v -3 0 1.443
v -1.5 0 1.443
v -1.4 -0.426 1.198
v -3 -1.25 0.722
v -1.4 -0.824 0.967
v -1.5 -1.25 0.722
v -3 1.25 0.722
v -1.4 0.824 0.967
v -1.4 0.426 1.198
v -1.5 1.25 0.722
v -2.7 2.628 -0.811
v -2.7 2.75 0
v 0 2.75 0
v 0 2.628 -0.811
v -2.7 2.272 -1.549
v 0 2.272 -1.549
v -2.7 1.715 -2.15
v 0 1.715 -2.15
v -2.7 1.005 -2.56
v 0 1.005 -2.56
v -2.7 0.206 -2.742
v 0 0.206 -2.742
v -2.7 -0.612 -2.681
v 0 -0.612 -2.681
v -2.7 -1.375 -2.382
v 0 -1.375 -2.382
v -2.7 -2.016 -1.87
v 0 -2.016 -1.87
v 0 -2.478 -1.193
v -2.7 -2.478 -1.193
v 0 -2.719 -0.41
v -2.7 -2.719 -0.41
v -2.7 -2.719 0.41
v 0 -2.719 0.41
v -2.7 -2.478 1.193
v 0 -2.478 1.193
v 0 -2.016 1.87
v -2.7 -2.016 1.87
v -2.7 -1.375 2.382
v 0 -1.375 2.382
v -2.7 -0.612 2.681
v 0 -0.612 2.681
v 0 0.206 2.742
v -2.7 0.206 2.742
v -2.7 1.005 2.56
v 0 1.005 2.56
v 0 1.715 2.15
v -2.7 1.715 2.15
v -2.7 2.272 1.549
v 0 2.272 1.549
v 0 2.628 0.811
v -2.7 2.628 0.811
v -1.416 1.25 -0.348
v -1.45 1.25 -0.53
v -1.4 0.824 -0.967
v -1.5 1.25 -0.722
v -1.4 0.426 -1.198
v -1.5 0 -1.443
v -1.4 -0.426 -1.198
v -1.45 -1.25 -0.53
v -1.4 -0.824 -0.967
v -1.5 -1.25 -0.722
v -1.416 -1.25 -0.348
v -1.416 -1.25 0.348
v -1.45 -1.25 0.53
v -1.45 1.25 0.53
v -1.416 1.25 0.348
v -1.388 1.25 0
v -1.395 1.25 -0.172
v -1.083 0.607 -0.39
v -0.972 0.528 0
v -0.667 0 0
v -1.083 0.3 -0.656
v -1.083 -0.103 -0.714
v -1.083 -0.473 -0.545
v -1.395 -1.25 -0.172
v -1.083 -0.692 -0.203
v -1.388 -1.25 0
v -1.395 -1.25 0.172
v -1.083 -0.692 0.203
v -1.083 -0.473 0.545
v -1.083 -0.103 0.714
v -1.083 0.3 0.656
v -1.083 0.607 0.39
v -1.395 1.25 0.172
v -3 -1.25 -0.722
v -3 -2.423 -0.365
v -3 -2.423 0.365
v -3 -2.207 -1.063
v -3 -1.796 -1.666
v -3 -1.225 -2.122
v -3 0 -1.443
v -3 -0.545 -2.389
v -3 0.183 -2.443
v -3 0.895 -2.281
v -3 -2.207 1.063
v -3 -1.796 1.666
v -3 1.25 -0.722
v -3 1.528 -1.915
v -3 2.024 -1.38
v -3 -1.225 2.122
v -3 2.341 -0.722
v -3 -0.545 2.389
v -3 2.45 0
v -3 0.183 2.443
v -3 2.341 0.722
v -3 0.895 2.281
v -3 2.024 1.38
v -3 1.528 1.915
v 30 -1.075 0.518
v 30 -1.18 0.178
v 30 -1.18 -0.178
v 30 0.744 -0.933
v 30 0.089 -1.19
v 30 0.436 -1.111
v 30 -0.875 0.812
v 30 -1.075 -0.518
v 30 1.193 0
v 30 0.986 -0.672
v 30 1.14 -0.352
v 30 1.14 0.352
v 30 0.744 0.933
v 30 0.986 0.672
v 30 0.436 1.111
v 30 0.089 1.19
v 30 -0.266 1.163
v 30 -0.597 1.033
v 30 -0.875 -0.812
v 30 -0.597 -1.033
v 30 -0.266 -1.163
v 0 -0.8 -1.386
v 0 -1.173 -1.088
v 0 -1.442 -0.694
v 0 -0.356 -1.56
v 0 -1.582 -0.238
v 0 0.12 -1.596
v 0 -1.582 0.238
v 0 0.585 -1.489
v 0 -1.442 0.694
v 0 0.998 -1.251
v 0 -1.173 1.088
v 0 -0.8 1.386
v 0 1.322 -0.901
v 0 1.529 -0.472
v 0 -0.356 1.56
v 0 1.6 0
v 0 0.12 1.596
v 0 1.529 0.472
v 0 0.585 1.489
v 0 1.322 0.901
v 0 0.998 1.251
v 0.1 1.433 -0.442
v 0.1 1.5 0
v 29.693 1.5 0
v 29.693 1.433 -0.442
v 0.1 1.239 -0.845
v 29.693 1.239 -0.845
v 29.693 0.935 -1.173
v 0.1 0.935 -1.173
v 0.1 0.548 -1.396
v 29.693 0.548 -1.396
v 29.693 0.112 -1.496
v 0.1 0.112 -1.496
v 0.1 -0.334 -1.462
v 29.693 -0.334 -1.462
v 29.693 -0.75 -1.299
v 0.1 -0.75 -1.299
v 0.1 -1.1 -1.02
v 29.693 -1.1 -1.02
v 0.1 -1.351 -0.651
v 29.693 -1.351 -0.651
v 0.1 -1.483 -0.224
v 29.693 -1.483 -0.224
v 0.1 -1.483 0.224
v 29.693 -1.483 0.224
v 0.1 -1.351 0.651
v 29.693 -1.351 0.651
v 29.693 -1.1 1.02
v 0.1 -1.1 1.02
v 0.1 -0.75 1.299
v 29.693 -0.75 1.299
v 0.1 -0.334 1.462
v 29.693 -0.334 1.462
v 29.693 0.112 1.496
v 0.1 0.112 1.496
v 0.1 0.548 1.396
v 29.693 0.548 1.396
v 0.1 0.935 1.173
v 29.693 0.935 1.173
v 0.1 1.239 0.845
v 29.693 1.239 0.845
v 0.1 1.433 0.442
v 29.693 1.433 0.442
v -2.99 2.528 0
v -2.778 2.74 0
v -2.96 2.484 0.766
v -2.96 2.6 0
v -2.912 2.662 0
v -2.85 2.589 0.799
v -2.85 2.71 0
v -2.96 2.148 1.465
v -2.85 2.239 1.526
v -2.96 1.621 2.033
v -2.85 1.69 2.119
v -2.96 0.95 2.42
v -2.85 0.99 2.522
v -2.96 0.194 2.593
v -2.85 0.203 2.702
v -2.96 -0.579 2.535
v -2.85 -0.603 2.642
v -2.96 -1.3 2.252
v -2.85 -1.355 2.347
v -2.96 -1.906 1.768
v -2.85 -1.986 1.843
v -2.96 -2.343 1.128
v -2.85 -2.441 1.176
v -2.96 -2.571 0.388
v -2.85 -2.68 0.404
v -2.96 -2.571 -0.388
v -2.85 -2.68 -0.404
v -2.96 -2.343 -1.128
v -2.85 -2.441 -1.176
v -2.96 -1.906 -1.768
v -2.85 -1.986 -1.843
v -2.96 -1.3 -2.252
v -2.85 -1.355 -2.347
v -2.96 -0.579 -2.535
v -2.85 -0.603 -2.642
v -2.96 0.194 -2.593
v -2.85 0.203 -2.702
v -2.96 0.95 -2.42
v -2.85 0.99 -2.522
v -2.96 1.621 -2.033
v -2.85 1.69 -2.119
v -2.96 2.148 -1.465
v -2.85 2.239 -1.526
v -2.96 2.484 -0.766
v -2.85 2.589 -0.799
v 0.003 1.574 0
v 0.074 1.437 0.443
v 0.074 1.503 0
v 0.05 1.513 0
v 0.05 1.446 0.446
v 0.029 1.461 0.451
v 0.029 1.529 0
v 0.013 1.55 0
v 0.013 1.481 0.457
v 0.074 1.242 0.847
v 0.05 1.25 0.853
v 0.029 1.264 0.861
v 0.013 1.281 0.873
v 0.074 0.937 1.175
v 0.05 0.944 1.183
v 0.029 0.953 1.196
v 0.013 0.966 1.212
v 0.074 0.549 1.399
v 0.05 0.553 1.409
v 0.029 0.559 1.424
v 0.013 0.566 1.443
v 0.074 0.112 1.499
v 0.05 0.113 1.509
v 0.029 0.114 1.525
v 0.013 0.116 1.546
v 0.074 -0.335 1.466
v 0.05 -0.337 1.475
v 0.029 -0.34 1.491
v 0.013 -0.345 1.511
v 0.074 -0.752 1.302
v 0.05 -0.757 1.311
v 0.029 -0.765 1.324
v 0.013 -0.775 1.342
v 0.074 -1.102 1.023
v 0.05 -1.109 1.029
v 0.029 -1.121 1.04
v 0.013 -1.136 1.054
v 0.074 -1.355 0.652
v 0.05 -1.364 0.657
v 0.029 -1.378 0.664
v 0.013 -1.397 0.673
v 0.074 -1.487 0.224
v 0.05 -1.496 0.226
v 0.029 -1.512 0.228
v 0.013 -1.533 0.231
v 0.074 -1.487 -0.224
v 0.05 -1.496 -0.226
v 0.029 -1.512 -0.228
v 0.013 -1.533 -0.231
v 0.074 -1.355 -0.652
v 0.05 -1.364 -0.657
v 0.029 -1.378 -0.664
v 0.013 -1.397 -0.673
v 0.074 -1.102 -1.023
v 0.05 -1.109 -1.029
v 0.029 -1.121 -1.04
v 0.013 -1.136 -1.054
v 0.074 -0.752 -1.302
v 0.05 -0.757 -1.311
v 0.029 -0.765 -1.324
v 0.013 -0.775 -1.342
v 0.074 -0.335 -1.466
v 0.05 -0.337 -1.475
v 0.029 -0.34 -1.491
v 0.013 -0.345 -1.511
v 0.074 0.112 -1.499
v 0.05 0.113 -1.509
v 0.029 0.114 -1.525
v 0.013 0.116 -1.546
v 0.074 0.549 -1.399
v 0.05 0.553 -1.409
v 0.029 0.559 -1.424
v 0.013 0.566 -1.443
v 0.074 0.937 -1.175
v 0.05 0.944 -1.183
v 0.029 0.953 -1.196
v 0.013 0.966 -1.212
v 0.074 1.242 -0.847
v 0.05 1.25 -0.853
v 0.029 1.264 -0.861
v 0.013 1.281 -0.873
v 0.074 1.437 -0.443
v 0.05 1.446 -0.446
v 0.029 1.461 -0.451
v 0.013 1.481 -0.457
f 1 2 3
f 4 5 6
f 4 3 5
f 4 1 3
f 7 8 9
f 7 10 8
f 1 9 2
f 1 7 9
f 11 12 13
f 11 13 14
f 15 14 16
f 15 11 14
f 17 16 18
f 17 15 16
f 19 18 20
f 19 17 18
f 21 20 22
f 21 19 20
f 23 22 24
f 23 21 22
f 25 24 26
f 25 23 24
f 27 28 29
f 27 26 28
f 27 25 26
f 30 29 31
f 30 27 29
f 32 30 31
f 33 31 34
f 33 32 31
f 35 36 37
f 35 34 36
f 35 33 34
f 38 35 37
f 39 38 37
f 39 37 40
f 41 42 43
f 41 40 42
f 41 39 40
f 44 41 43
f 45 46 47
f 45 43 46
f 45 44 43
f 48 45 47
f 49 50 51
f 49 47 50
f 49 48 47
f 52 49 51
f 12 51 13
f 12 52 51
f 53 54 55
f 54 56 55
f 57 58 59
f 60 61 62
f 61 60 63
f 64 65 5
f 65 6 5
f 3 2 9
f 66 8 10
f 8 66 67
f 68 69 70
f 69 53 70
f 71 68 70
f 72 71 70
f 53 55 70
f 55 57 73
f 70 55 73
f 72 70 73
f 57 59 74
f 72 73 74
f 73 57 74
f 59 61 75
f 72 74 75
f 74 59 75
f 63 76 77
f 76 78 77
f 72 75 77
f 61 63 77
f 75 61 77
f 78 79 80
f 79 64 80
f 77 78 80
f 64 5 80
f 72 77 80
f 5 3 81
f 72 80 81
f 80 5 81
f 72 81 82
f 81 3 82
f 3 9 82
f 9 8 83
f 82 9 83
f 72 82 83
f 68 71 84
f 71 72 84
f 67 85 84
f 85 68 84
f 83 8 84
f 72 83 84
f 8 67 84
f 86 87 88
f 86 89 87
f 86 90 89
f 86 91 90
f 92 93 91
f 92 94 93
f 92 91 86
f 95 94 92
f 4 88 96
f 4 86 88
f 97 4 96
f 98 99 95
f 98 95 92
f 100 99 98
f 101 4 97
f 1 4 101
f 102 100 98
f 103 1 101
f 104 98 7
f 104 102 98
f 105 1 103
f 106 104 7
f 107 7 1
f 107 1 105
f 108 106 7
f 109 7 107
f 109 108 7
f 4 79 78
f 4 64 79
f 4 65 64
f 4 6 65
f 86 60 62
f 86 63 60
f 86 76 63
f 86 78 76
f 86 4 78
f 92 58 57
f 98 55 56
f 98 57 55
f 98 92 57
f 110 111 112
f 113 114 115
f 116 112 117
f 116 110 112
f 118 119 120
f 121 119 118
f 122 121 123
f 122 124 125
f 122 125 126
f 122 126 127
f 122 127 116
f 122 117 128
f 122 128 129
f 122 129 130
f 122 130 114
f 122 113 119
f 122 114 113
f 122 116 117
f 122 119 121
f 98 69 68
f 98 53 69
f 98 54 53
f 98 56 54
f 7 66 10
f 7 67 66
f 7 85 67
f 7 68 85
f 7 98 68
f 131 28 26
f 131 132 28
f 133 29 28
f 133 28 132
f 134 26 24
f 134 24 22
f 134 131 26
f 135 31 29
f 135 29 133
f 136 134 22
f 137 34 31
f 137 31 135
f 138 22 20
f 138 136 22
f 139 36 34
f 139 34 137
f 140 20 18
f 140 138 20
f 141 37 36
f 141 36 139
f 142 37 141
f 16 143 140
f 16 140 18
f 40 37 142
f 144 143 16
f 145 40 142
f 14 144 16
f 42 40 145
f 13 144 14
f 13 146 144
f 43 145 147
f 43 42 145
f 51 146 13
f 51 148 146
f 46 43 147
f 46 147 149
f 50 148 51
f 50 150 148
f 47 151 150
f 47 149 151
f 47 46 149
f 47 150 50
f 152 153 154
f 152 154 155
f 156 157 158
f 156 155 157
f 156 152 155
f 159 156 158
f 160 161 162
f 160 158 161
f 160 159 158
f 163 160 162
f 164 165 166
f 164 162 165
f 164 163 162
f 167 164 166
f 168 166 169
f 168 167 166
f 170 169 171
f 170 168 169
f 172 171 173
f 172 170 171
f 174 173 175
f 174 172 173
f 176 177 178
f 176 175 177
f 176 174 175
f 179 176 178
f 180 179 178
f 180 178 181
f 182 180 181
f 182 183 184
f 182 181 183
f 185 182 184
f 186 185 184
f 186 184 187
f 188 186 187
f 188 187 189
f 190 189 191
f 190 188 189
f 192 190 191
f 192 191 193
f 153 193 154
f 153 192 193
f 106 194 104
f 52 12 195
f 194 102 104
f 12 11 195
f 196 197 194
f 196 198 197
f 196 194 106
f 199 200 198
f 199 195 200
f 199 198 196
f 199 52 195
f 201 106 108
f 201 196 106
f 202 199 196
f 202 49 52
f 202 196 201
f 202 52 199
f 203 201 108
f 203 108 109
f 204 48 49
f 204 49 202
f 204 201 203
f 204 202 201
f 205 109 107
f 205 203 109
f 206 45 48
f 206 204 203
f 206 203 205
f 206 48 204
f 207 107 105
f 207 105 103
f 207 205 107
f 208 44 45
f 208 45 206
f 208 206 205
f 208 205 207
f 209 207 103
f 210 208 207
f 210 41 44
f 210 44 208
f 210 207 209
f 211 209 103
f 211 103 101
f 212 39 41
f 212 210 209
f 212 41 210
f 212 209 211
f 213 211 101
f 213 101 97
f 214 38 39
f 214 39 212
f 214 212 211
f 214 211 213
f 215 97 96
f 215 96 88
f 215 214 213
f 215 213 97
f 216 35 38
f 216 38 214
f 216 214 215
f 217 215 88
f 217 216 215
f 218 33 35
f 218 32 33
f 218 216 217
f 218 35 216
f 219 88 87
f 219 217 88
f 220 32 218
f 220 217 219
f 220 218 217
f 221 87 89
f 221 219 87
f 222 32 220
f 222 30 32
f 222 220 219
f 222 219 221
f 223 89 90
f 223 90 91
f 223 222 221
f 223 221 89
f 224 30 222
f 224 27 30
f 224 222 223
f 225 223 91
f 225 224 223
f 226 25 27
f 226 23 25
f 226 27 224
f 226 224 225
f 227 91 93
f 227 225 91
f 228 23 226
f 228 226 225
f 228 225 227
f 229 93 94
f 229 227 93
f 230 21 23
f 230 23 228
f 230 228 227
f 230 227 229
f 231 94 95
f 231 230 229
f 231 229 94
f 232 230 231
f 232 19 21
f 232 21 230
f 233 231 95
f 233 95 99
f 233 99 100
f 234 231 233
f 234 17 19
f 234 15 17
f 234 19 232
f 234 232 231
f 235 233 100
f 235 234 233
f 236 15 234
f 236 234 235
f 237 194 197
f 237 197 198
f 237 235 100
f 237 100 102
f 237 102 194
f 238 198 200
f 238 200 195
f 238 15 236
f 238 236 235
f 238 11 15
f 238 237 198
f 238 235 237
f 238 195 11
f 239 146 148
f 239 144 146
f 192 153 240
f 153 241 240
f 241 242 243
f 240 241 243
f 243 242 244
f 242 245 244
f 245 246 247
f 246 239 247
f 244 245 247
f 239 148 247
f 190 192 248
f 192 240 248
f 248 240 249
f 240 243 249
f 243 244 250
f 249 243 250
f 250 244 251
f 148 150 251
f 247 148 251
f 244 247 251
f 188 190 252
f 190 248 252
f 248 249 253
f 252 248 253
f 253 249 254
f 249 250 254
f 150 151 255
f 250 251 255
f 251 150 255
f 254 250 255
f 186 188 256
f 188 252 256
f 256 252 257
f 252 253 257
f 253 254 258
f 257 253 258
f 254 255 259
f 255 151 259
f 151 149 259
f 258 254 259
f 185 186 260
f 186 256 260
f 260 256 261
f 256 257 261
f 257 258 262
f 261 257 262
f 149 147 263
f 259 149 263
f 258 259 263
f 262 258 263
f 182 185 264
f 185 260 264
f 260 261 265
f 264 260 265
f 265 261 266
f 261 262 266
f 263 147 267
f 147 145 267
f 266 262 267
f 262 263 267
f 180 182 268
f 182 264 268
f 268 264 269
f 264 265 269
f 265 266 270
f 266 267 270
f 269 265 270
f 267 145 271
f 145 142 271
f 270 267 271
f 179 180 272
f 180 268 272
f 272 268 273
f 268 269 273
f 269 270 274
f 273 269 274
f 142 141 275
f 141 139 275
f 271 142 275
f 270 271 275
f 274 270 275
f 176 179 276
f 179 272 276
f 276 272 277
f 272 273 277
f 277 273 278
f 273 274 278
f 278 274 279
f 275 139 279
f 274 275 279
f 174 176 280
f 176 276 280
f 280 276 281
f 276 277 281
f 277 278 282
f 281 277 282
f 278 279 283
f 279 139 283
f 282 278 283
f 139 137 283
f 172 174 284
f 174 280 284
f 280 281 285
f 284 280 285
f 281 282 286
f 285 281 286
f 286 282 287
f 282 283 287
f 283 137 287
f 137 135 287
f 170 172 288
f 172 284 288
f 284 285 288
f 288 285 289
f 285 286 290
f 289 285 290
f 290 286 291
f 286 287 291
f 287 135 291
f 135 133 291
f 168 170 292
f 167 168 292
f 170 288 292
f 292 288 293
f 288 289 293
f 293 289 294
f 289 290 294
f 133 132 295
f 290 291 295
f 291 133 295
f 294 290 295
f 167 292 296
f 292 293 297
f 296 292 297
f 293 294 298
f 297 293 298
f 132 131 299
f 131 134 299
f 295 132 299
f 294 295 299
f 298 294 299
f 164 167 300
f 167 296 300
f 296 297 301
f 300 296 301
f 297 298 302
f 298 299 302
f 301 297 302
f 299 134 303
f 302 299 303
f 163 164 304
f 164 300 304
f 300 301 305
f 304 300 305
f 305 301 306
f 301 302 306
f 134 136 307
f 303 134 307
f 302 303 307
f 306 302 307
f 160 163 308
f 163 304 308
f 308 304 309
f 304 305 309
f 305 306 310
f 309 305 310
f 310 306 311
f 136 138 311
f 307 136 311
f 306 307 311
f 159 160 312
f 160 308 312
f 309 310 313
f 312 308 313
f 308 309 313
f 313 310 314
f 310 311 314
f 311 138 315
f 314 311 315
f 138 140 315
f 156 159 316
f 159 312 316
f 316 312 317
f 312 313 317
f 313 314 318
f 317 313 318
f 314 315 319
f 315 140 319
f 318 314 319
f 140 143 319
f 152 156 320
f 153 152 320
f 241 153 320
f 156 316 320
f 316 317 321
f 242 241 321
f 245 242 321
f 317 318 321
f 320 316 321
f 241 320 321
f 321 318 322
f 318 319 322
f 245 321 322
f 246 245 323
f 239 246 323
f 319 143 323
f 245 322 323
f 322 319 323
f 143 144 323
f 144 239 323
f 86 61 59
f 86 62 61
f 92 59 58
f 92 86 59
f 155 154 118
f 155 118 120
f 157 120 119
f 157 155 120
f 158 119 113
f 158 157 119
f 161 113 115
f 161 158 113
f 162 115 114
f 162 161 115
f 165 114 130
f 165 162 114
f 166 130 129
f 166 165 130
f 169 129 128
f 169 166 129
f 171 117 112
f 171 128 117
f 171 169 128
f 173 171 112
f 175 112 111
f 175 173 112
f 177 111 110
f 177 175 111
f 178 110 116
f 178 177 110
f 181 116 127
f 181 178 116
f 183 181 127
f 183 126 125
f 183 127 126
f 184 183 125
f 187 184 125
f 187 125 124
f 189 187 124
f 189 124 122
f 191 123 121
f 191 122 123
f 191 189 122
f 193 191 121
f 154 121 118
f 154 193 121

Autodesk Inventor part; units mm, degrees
ref_plane "YZ Plane" through (0, 0, 0) normal (1, 0, 0) x (0, 1, 0)
ref_plane "XZ Plane" through (0, 0, 0) normal (0, 1, 0) x (-1, 0, 0)
sketch "Sketch1" plane through (0, 0, 0) normal (0, 0, 1) x (1, 0, 0)
  line L0 (-0.6667, 0) -> (30, 0)
  line L1 (30, 0) -> (30, 1.5)
  line L2 (30, 1.5) -> (12, 1.5)
  line L3 (12, 1.5) -> (11.6933, 1.5)
  line L4 (11.6933, 1.5) -> (0, 1.5)
  line L5 (0, 1.5) -> (0, 2.75)
  line L6 (0, 2.75) -> (-3, 2.75)
  line L7 (-3, 2.75) -> (-3, 1.4434)
  line L8 (-3, 1.4434) -> (-1.5, 1.4434)
  line L9 (-1.5, 1.4434) -> (-0.6667, 0)
  line L10 (-9.6, 0) -> (36.6, 0) projected
  line L11 (0, -0.55) -> (0, 3.3) projected
  line L12 (12, 1.5) -> (0, 1.5) construction
  dimension "d0" = 18
  dimension "d1" = 0.3067
  dimension "d2" = 3
  dimension "d3" = 1.5
  dimension "d4" = 60
  dimension "d5" = 3
  dimension "d6" = 3
  dimension "d7" = 2.8868
  dimension "d8" = 5.5
  dimension "d19" = 30
revolve "Body" add sketch "Sketch1" angle 360 about axis through (-0.6667, 0, 0) along (1, 0, 0)
sketch "Sketch2" plane through (-3, 0, 0) normal (-1, 0, 0) x (0, 0, 1)
  circle A0 centre (0, 0) radius 1.4434 projected
  line L0 (0, -3.85) -> (0, 3.85) projected
  line L1 (-3.85, 0) -> (3.85, 0) projected
  line L2 (1.4434, 0) -> (0.7217, -1.25)
  line L3 (0.7217, -1.25) -> (-0.7217, -1.25)
  line L4 (-0.7217, -1.25) -> (-1.4434, 0)
  line L5 (-1.4434, 0) -> (-0.7217, 1.25)
  line L6 (-0.7217, 1.25) -> (0.7217, 1.25)
  line L7 (0.7217, 1.25) -> (1.4434, 0)
extrude "Slot" add sketch "Sketch2" against normal up to next contours L7 A0 | A0 L2 | L6 L0 A0 | A0 L0 L3 | L0 L6 A0 | A0 L3 L0 | L4 A0 | A0 L5
fillet "Fillet2" radius 0.3 1 edges at (-3, -2.75, 0)
thread "Thread" size "M3x0.5" class "6g" standard "ISO Metric profile" length 18
chamfer "Chamfer1" distance 0.3067 distance2 0.3067 1 edges at (30, -1.5, 0) measured on face at (30, -0.3888, 0.2119)
fillet "Fillet1" radius 0.1 1 edges at (0, -1.5, 0)
ref_plane "Work Plane1" through (30, 0, 0) normal (0, -0.5, 0.866) x (1, 0, 0)
equation "\"d0\" = GEL"
equation "\"d1\" = GAL"
equation "\"d2\" = KOH"
equation "\"d3\" = INTI"
equation "\"d5\" = GD"
equation "\"d6\" = BDM"
equation "\"d7\" = 1.1547 * SW"
equation "\"d8\" = KOD"
equation "\"d19\" = NLG"
equation "\"d16\" = RR"
equation "\"d12\" = GEL"
equation "\"d14\" = -0.5 * SPD + 0.5 * GD"
equation "\"d15\" = GUL"
equation "\"d29\" = R"
equation "\"GD\" = NND"
equation "\"NLG\" = 30"
equation "\"GEL\" = 18"
equation "\"KOD\" = 5.5"
equation "\"KOH\" = 3"
equation "\"INTI\" = 1.5"
equation "\"GAL\" = 0.61345 * PTC"
equation "\"GUL\" = 0.61345 * PTC"
equation "\"BDM\" = NND"
equation "\"SW\" = 2.5"
equation "\"RR\" = 0.3"
equation "\"SPD\" = 2.38655"
equation "\"d28\" = R"
equation "\"R\" = 0.1"
equation "\"TOA\" = 30deg"
equation "\"THREADDIA\" = 3"
equation "\"KOD1\" = KOD"
equation "\"PTC\" = 0.5"
equation "\"NND\" = 3"
equation "\"E0\" = 1.155 * SW"
equation "\"GD1\" = THREADDIA - 1.2269 * PTC"
properties part number "ANSI B18.3.1M - M3x0.5 x 30" material "Steel, Mild"
